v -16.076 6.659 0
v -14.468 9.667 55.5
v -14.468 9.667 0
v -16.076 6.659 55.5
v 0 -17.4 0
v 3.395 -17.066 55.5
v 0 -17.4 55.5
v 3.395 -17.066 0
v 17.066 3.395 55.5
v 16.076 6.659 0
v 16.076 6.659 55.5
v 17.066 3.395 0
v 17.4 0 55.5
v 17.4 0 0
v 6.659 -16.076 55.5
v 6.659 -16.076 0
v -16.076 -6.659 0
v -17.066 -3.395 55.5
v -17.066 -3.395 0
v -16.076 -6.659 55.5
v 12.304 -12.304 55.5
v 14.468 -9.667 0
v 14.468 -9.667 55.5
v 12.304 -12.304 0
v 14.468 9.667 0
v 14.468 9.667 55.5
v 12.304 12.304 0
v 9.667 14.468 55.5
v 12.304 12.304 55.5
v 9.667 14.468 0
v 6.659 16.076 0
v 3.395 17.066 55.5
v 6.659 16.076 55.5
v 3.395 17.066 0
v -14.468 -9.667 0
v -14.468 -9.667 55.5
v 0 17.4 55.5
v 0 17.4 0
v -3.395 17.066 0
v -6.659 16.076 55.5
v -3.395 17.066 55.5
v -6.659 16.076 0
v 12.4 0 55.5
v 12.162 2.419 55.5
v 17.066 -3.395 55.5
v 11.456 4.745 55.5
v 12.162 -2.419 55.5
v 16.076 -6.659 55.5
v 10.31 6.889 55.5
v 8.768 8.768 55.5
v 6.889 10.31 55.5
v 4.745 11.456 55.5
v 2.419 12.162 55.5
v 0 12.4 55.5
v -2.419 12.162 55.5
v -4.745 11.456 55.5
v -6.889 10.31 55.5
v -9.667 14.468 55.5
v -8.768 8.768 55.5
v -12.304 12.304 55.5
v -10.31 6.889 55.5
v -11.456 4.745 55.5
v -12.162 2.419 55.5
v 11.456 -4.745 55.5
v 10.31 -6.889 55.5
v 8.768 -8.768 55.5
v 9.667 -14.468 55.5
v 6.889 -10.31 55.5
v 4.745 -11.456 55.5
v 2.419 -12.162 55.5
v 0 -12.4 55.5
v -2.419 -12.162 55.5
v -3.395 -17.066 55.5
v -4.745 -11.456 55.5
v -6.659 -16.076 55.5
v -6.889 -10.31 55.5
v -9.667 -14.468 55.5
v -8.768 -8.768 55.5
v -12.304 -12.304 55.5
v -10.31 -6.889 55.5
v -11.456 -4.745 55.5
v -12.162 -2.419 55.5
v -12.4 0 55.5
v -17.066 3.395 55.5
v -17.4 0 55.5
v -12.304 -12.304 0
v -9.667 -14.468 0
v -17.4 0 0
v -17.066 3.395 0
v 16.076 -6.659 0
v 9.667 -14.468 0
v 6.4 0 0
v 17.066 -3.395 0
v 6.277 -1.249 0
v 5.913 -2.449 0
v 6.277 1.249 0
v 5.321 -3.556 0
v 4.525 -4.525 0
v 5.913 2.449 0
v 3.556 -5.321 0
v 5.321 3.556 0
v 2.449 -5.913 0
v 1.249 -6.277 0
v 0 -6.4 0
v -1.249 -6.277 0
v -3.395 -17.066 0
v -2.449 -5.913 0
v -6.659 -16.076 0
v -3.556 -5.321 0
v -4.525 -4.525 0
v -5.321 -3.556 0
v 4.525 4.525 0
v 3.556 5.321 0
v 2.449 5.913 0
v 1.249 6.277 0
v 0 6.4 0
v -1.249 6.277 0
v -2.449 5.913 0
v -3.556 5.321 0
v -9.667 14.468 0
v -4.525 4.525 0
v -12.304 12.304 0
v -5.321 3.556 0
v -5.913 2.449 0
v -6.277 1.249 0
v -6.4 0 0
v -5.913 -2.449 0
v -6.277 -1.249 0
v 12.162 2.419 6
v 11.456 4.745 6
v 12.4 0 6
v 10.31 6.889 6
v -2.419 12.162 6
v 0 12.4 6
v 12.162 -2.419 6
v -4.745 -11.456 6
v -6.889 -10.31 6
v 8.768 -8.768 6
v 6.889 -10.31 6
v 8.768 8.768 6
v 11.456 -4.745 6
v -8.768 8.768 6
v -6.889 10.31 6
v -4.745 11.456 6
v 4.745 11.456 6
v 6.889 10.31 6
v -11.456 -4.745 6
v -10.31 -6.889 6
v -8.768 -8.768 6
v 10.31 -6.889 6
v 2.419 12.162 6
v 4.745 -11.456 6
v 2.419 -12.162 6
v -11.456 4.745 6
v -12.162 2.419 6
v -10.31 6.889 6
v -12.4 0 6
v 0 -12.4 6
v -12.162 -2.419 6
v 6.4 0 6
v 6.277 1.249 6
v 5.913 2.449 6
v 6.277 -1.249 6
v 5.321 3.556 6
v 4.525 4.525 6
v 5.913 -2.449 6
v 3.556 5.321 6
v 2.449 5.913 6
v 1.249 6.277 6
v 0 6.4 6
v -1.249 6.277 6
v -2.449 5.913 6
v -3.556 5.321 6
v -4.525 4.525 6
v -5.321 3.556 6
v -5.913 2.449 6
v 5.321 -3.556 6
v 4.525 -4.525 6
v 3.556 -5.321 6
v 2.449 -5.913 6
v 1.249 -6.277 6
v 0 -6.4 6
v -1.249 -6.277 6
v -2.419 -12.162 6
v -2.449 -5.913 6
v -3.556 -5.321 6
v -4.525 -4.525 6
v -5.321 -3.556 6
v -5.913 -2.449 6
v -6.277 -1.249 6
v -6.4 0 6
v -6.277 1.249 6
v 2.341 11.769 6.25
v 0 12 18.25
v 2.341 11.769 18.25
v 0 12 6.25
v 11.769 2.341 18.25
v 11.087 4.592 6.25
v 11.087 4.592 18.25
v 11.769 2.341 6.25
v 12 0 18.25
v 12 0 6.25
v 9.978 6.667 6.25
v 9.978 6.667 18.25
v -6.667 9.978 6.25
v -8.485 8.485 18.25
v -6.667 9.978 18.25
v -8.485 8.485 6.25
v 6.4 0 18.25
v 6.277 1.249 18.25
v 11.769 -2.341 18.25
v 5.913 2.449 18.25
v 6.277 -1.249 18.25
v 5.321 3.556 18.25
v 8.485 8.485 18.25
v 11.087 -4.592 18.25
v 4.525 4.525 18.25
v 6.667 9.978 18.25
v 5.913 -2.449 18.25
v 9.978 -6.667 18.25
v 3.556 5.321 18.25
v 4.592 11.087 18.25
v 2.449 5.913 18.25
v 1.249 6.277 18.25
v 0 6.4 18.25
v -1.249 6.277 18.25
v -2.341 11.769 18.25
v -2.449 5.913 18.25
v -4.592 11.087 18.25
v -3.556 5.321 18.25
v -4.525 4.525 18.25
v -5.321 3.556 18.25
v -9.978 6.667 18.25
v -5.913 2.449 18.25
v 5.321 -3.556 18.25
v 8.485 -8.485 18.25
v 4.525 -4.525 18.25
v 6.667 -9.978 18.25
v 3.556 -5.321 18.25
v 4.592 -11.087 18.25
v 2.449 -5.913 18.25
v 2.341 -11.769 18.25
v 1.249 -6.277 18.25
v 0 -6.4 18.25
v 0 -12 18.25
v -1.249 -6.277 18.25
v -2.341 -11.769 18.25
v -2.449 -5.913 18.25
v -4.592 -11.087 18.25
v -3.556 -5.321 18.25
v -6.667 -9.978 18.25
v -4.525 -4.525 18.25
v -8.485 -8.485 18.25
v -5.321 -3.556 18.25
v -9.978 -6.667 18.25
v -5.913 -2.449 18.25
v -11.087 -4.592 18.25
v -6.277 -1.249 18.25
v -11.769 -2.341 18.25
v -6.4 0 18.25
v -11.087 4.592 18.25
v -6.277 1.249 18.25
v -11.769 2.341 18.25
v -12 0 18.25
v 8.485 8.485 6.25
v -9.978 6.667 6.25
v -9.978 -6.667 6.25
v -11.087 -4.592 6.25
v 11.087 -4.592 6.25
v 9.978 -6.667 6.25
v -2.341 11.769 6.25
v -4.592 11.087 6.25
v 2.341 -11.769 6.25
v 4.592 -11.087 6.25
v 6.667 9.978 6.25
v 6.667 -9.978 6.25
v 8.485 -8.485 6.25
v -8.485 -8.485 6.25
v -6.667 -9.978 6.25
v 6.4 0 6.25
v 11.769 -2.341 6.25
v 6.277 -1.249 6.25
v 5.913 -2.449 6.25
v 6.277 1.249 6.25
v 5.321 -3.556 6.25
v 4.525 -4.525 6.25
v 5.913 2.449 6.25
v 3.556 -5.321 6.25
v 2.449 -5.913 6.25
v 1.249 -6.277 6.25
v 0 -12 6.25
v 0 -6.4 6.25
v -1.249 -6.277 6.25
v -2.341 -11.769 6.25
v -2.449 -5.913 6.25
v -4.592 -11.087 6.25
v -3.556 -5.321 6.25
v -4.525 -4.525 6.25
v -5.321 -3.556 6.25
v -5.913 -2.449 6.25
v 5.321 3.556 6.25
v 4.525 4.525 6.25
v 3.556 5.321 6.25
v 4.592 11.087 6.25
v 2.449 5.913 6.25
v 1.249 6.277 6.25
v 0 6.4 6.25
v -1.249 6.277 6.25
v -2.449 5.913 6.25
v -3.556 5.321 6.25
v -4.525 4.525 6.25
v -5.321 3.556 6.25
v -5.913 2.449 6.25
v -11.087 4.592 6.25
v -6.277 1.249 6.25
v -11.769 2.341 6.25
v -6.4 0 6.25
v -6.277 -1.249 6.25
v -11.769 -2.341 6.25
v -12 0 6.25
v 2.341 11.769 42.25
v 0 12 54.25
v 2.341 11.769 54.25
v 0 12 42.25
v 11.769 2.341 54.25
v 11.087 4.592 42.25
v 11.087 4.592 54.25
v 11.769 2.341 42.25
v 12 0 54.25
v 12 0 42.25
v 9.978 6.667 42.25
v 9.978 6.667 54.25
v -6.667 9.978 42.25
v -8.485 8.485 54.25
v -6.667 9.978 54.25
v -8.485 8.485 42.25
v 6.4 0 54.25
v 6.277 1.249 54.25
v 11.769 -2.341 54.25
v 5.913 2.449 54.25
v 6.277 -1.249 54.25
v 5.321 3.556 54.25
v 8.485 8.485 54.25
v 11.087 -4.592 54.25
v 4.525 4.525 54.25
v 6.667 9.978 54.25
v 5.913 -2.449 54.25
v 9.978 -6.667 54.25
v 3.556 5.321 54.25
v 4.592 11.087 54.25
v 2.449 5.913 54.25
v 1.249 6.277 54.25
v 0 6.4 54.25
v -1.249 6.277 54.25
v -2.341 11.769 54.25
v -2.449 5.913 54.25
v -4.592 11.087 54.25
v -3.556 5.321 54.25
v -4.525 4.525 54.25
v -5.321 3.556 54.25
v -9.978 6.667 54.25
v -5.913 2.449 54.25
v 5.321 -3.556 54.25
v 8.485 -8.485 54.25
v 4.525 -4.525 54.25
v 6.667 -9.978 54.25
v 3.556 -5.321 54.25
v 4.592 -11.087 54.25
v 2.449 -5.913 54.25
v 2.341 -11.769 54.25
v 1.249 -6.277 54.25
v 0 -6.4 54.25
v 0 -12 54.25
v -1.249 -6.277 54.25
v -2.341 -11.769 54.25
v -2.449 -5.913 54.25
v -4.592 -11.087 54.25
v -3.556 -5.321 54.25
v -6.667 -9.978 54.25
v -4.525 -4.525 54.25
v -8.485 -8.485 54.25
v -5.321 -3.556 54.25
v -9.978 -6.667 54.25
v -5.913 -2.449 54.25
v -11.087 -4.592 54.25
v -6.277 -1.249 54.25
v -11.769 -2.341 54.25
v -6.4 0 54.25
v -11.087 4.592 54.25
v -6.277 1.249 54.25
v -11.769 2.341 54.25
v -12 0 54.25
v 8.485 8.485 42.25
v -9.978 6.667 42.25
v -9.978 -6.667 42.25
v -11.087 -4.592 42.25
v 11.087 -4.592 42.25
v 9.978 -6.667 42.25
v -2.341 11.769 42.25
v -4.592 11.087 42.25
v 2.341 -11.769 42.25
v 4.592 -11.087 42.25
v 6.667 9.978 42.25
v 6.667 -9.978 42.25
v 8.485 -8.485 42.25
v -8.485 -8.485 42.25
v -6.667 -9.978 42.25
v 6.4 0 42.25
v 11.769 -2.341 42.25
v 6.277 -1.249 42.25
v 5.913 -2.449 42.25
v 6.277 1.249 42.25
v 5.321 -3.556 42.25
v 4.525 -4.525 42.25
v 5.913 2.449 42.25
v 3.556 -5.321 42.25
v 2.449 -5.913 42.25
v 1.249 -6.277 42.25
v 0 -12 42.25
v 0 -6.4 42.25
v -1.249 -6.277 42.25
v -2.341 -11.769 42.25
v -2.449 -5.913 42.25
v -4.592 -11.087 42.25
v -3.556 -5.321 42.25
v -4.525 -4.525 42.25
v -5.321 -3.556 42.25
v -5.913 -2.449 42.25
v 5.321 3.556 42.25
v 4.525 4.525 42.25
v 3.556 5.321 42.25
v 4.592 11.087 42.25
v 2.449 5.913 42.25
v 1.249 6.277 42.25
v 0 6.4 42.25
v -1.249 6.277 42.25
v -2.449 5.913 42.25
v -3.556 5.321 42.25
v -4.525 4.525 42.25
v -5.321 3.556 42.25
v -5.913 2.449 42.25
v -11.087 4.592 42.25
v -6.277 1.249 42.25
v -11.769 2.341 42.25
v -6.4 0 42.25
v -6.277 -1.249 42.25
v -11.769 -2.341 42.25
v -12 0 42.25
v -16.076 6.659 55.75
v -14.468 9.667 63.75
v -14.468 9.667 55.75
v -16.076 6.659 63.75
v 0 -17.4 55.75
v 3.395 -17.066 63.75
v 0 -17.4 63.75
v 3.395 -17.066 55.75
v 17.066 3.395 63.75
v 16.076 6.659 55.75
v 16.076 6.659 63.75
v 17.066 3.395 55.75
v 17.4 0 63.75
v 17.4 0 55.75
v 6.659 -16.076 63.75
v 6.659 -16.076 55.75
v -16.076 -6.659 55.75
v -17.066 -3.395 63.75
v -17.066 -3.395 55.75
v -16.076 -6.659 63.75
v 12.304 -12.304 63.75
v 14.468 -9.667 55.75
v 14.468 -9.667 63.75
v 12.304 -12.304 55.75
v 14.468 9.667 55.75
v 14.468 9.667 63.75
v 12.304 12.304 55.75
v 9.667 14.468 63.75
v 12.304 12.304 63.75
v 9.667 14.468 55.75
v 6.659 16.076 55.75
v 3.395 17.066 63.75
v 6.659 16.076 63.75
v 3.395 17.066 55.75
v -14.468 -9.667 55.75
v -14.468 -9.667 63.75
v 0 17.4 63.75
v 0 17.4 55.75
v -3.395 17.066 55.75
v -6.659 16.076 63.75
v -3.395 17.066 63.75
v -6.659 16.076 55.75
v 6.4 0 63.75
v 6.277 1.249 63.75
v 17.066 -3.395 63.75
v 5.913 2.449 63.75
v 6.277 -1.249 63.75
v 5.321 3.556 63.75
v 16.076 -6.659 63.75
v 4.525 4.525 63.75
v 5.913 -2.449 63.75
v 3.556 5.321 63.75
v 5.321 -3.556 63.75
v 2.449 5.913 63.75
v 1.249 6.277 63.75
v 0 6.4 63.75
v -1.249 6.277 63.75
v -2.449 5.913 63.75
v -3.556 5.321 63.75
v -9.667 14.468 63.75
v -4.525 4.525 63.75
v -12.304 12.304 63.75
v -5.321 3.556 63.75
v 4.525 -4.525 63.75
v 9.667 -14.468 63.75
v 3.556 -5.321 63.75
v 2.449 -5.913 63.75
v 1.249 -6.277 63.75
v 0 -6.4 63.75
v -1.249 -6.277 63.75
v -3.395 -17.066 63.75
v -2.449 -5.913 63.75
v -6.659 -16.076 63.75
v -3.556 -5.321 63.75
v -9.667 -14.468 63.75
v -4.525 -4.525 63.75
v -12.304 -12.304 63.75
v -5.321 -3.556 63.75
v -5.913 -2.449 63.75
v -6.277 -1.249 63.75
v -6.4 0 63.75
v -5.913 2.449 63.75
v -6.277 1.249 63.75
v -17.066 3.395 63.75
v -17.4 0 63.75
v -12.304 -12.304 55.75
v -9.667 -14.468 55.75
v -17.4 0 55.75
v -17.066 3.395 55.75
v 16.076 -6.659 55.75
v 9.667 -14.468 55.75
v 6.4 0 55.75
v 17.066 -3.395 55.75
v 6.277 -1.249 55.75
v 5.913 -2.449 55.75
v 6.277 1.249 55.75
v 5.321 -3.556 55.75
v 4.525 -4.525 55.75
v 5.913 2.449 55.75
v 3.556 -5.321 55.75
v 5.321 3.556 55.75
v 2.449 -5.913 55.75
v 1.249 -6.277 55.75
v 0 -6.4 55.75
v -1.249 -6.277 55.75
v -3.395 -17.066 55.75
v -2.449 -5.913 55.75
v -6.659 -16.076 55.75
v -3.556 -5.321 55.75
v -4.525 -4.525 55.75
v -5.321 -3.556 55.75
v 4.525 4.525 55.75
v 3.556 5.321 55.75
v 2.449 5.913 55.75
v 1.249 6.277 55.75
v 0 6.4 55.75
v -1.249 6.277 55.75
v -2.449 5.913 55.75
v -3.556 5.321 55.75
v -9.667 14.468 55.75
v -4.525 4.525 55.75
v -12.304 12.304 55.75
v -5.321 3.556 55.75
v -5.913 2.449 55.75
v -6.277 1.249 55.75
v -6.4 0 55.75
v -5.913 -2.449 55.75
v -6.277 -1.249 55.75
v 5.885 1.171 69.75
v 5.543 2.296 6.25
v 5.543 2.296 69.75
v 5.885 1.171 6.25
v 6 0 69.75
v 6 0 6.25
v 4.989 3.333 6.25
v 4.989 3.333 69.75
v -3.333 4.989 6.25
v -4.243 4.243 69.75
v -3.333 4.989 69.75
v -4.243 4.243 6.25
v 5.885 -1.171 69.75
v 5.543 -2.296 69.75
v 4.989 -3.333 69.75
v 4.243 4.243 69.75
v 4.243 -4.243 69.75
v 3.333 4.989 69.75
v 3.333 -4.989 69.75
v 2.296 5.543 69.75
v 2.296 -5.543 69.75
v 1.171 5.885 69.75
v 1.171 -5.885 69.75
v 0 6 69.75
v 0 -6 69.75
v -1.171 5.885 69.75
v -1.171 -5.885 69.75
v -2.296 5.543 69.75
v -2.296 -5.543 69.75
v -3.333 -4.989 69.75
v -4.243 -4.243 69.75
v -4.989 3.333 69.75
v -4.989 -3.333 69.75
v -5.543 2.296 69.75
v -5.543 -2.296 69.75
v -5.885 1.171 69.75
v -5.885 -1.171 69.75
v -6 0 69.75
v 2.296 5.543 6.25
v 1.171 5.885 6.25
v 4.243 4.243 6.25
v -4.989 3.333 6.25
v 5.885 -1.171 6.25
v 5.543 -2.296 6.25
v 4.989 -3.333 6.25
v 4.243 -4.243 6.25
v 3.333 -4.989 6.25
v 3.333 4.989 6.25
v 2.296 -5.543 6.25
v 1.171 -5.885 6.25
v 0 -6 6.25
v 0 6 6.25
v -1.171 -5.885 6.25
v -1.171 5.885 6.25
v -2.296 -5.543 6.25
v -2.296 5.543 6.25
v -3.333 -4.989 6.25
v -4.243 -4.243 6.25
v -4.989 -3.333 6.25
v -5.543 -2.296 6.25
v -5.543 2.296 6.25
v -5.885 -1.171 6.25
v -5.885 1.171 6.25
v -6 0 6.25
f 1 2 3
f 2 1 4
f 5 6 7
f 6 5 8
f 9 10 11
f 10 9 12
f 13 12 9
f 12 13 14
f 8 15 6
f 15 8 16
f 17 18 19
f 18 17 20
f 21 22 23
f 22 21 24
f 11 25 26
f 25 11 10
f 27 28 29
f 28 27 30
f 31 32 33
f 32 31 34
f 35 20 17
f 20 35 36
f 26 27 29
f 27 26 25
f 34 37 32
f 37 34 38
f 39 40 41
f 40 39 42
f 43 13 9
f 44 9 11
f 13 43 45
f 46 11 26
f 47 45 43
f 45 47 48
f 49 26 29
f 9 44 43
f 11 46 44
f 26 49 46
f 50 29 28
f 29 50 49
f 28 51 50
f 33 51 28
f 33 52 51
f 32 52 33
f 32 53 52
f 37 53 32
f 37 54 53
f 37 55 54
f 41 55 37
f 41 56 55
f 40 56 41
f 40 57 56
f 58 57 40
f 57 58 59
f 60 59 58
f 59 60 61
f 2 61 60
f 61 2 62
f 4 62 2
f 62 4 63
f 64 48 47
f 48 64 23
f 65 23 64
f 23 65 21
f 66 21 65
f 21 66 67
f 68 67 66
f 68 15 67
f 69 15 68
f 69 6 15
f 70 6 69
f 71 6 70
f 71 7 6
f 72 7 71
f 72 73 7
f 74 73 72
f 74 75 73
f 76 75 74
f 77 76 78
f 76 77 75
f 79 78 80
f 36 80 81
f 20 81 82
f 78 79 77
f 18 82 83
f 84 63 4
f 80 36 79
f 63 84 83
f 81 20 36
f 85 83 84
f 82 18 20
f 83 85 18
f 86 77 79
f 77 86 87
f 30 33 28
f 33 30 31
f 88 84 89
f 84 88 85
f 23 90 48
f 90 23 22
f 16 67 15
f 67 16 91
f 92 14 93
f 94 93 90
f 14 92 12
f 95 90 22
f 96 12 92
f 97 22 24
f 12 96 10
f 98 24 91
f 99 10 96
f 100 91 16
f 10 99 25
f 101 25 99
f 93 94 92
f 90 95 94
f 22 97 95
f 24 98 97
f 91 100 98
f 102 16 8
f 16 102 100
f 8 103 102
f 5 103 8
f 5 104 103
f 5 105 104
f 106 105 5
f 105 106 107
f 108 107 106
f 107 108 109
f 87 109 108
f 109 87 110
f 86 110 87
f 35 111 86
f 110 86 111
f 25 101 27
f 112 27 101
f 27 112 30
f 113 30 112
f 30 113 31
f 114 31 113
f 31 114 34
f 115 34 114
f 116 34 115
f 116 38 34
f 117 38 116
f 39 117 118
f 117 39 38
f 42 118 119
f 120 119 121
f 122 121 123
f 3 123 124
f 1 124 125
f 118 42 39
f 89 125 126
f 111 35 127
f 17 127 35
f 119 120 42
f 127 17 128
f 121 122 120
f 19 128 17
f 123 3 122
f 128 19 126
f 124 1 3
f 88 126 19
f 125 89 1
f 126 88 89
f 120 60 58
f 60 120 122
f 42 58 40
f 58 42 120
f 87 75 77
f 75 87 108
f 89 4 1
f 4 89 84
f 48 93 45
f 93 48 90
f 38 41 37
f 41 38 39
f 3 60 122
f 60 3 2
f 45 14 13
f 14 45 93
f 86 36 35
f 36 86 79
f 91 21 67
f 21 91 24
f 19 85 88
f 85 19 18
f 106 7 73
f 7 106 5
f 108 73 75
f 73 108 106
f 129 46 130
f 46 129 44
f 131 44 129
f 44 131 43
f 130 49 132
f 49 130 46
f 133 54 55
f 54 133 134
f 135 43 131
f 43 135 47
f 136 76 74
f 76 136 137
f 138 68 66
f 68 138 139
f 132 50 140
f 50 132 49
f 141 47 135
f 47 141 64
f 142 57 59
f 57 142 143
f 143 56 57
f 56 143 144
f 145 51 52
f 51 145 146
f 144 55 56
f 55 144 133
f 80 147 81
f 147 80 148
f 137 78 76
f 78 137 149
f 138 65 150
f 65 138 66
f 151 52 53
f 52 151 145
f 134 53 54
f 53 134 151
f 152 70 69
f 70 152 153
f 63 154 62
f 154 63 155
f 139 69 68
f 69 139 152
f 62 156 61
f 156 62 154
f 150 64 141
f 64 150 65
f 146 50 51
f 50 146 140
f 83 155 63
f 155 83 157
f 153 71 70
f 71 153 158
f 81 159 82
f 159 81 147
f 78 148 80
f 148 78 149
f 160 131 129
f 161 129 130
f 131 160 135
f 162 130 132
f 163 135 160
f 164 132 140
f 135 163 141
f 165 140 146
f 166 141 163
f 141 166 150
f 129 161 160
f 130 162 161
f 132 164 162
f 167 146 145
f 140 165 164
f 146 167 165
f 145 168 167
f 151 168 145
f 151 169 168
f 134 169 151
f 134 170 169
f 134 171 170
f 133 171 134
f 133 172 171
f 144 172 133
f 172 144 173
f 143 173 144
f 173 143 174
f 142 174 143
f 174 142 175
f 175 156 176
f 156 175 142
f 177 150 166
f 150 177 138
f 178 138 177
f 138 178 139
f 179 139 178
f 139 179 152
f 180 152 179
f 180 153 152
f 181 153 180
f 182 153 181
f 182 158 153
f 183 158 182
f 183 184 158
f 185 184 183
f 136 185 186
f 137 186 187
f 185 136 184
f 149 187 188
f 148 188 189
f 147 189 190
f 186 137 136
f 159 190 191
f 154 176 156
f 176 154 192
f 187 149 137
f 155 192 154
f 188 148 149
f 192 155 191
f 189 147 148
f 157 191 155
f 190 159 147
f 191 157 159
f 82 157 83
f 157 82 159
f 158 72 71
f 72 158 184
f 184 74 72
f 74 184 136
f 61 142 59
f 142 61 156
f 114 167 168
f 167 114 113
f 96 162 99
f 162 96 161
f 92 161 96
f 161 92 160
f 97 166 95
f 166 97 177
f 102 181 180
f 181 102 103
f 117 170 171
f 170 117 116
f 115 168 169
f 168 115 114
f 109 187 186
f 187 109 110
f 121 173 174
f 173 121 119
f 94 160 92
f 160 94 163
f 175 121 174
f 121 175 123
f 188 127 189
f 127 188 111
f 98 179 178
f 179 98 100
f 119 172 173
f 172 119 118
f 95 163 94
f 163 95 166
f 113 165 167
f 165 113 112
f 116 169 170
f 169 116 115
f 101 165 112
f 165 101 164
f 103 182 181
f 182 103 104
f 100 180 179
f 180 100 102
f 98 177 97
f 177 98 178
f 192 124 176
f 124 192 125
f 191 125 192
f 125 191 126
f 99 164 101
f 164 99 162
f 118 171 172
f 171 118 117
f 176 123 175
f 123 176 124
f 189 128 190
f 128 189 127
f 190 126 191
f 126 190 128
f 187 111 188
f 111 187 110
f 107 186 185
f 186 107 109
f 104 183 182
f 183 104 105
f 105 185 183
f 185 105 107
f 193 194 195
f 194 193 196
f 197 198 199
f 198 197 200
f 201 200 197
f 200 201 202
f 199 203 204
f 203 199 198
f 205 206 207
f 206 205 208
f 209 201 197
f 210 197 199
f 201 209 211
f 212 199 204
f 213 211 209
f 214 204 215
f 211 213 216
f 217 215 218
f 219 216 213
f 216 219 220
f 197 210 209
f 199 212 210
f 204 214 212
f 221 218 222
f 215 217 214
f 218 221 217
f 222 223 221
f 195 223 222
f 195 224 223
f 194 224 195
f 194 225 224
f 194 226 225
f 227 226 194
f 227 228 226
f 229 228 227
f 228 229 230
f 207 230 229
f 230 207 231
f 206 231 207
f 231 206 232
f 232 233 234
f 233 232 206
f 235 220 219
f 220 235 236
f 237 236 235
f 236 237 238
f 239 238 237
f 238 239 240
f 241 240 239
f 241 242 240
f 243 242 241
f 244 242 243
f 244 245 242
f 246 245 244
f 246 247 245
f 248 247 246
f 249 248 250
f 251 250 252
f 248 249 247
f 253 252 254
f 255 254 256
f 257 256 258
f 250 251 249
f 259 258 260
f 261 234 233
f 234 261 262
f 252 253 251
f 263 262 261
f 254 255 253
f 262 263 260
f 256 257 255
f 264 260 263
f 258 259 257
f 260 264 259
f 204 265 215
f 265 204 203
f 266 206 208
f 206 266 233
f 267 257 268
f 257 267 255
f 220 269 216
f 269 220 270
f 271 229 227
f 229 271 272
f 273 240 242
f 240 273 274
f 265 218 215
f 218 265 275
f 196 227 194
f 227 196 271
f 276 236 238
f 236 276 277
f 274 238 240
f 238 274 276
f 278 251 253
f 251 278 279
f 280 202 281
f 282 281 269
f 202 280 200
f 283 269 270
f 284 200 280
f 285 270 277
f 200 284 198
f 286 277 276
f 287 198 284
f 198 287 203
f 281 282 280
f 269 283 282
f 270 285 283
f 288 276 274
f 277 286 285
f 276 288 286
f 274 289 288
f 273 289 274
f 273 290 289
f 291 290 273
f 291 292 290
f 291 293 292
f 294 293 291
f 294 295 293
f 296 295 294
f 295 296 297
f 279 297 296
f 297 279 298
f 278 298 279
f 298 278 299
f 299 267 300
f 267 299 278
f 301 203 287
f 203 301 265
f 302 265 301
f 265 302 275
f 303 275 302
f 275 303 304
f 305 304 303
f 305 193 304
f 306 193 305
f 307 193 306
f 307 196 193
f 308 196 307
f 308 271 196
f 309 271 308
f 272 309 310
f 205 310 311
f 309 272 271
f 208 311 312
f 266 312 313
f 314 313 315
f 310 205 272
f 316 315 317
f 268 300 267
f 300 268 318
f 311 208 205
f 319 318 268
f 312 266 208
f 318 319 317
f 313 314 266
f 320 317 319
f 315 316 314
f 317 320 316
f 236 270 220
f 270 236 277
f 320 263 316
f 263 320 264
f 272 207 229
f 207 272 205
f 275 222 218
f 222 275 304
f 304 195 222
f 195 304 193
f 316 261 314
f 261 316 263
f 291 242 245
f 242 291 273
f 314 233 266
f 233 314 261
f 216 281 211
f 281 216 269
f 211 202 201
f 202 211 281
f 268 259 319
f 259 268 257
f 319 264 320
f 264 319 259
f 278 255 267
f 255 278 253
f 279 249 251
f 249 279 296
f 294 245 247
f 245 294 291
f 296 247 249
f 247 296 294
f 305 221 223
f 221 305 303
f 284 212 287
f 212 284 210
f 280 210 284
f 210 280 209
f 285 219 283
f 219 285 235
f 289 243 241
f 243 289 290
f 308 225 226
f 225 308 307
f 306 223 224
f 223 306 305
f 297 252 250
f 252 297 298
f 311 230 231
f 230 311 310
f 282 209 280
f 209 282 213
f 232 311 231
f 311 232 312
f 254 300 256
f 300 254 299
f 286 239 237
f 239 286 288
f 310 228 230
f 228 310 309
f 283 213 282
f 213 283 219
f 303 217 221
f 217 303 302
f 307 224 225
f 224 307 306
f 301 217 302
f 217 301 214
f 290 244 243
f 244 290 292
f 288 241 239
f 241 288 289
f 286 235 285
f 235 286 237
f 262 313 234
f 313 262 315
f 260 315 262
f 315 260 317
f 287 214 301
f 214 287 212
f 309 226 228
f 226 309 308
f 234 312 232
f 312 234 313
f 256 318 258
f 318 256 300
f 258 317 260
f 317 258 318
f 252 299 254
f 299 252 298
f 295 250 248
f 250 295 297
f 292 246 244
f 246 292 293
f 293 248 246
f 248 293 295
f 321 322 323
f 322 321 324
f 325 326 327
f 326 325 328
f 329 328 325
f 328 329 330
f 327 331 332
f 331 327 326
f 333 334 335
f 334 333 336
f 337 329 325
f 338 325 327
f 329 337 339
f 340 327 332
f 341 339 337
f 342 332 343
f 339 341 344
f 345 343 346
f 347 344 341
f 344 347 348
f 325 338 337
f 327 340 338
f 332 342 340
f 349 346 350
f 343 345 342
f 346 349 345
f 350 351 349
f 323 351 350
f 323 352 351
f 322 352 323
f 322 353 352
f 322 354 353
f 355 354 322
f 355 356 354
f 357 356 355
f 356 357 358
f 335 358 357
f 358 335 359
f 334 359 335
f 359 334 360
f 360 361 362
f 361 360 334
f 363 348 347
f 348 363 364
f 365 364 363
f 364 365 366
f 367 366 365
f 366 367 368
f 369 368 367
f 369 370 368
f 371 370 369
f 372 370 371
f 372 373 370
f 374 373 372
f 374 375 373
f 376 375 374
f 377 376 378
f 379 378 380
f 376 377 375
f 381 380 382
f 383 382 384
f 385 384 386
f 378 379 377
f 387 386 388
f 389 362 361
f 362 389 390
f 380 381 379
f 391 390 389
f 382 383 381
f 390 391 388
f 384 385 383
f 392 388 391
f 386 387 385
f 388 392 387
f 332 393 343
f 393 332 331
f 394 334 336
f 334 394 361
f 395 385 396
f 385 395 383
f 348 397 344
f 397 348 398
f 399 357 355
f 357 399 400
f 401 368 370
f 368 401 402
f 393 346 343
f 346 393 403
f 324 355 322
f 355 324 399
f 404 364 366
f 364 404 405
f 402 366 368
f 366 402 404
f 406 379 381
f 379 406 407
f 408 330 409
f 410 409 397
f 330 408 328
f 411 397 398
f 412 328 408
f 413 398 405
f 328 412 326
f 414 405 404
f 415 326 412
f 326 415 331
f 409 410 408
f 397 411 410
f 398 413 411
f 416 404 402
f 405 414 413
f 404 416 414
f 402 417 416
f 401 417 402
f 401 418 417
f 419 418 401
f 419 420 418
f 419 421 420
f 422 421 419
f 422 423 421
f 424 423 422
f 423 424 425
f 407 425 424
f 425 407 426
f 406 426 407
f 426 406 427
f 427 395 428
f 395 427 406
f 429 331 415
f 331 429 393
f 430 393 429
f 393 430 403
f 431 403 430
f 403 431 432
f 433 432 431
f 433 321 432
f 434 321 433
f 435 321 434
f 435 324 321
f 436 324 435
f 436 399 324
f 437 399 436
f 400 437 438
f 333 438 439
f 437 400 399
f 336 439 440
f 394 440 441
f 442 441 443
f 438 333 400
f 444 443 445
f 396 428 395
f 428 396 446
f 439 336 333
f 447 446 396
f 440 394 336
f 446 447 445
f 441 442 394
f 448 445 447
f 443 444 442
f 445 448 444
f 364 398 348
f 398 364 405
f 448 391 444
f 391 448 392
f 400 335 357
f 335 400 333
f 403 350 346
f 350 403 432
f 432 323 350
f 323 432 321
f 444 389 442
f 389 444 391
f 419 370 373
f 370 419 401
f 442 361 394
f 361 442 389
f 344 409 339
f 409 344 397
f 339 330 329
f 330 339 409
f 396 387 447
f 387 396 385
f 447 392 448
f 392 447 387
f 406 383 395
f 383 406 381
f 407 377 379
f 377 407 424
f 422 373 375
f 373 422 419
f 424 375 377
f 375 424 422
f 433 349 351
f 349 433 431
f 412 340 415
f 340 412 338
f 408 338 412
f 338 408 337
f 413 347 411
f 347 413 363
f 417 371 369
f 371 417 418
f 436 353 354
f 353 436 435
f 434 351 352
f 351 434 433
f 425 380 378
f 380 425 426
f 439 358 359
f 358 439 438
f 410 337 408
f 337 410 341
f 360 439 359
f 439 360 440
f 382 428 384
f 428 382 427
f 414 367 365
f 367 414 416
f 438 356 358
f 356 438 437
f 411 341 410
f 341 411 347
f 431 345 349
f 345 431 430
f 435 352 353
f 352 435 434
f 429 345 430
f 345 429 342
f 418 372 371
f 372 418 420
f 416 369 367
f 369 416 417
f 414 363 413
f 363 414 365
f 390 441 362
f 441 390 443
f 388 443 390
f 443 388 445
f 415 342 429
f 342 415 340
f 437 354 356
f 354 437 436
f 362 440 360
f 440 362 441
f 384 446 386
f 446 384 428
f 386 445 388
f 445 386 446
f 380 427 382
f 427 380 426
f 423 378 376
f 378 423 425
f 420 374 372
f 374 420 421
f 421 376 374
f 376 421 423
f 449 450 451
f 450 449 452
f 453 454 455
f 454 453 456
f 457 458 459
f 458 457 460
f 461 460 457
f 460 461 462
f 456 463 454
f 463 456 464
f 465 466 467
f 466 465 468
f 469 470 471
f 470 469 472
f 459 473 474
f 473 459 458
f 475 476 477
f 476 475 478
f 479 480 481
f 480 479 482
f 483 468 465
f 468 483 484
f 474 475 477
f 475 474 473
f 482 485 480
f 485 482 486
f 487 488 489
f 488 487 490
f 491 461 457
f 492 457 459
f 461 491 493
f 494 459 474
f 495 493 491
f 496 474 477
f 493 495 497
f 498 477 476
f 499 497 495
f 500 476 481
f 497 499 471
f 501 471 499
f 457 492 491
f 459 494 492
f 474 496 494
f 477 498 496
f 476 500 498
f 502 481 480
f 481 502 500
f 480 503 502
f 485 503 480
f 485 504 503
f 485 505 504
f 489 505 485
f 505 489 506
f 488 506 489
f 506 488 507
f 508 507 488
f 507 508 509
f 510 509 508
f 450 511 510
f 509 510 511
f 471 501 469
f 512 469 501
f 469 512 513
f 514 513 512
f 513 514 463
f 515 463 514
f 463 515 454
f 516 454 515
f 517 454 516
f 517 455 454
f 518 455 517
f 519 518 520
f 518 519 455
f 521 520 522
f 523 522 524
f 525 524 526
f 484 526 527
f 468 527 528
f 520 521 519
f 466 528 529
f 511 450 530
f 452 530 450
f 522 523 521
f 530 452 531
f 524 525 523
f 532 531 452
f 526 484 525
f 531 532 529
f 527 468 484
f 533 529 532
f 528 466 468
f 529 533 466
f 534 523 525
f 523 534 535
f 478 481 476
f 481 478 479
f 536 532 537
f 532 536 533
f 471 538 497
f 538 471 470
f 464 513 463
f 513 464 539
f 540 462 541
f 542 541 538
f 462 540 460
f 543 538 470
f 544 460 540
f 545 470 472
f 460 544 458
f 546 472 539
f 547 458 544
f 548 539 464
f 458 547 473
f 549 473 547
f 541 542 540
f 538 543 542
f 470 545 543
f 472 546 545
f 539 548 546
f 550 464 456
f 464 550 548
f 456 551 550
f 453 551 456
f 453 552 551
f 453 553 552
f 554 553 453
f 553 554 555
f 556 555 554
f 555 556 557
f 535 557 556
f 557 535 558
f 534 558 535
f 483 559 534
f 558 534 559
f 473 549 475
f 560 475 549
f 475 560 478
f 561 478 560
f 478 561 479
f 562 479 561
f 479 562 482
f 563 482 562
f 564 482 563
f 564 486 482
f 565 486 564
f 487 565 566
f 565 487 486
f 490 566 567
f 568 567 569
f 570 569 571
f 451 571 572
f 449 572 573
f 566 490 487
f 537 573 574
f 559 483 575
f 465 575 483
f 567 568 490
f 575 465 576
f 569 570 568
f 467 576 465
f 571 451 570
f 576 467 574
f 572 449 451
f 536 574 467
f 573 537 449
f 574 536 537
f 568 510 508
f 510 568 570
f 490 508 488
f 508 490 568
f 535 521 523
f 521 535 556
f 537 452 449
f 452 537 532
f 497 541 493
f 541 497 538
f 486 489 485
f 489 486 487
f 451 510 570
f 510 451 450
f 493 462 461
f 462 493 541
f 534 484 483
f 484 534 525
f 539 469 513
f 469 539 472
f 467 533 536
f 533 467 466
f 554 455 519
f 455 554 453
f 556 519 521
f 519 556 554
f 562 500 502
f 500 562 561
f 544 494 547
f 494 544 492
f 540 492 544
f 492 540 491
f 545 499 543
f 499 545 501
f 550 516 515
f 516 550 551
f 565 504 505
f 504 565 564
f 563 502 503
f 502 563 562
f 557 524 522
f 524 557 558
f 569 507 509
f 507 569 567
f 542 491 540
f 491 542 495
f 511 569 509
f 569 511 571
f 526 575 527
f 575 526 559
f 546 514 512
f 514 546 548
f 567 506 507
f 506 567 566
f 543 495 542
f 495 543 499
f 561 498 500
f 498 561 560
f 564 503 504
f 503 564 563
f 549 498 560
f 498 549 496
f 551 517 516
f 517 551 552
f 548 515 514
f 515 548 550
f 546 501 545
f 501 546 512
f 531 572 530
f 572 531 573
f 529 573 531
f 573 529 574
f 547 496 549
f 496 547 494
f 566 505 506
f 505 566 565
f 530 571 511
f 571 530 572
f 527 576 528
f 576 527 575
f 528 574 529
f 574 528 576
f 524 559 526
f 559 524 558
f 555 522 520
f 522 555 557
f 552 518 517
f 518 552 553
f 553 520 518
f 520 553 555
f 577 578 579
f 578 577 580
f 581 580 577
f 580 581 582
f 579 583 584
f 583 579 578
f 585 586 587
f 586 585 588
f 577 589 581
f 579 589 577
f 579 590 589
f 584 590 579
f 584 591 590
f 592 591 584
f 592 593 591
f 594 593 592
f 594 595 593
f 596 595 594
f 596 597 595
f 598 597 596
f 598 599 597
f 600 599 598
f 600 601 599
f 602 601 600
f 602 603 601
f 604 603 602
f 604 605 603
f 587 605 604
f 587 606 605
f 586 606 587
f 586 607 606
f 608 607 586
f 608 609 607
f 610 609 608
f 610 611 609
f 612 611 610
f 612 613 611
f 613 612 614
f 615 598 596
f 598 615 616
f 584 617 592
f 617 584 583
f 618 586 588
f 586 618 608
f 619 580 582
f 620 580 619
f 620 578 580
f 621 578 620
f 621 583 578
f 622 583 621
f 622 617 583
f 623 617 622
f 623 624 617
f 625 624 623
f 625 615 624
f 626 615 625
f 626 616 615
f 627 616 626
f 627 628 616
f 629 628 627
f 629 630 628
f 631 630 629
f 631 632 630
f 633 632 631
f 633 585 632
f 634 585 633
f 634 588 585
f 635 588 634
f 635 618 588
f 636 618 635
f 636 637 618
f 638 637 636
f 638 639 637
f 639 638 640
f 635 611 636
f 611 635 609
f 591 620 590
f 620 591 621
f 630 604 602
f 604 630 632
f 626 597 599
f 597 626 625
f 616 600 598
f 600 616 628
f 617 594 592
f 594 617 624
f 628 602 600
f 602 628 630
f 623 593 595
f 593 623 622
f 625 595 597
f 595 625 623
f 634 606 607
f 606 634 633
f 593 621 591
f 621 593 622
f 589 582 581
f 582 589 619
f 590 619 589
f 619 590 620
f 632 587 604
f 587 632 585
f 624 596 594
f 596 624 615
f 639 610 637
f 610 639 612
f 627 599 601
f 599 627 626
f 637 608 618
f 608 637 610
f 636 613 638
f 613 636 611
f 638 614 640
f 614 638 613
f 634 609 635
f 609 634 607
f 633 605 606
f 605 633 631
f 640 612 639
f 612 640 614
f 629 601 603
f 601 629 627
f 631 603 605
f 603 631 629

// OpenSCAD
$fn = 32;

// ------------------------------------------------------------------------
// Shaft station: cup d34.8 x 55.5 mm, shaft d12
// Every part is its own module, assembly() places every instance.
// ------------------------------------------------------------------------

// --- part 1 ---
module housing_cup() {
  difference() {
    cylinder(h = 55.5, d = 34.8);
    translate([0, 0, 6]) cylinder(h = 50.5, d = 24.8);
    translate([0, 0, -1]) cylinder(h = 8, d = 12.8);
  }
}

// --- part 2 ---
module bearing_lower() {
  difference() {
      translate([0, 0, 0]) cylinder(h = 12, d = 24);
      translate([0, 0, -1]) cylinder(h = 14, d = 12.8);
    }
}

// --- part 3 ---
module bearing_upper() {
  difference() {
      translate([0, 0, 0]) cylinder(h = 12, d = 24);
      translate([0, 0, -1]) cylinder(h = 14, d = 12.8);
    }
}

// --- part 4 ---
module station_shaft() {
  translate([0, 0, -31.75]) cylinder(h = 63.5, d = 12);
}

// --- part 5 ---
module station_cover() {
  difference() {
    cylinder(h = 8, d = 34.8);
    translate([0, 0, -1]) cylinder(h = 10, d = 12.8);
  }
}

// --- assembly ---
module assembly() {
  color([0.80, 0.24, 0.20]) translate([0, 0, 0]) rotate([0, 0, 0]) housing_cup();
  color([0.20, 0.45, 0.75]) translate([0, 0, 6.25]) rotate([0, 0, 0]) bearing_lower();
  color([0.25, 0.62, 0.32]) translate([0, 0, 42.25]) rotate([0, 0, 0]) bearing_upper();
  color([0.92, 0.70, 0.18]) translate([0, 0, 38]) rotate([0, 0, 0]) station_shaft();
  color([0.58, 0.35, 0.70]) translate([0, 0, 55.75]) rotate([0, 0, 0]) station_cover();
}

assembly();
